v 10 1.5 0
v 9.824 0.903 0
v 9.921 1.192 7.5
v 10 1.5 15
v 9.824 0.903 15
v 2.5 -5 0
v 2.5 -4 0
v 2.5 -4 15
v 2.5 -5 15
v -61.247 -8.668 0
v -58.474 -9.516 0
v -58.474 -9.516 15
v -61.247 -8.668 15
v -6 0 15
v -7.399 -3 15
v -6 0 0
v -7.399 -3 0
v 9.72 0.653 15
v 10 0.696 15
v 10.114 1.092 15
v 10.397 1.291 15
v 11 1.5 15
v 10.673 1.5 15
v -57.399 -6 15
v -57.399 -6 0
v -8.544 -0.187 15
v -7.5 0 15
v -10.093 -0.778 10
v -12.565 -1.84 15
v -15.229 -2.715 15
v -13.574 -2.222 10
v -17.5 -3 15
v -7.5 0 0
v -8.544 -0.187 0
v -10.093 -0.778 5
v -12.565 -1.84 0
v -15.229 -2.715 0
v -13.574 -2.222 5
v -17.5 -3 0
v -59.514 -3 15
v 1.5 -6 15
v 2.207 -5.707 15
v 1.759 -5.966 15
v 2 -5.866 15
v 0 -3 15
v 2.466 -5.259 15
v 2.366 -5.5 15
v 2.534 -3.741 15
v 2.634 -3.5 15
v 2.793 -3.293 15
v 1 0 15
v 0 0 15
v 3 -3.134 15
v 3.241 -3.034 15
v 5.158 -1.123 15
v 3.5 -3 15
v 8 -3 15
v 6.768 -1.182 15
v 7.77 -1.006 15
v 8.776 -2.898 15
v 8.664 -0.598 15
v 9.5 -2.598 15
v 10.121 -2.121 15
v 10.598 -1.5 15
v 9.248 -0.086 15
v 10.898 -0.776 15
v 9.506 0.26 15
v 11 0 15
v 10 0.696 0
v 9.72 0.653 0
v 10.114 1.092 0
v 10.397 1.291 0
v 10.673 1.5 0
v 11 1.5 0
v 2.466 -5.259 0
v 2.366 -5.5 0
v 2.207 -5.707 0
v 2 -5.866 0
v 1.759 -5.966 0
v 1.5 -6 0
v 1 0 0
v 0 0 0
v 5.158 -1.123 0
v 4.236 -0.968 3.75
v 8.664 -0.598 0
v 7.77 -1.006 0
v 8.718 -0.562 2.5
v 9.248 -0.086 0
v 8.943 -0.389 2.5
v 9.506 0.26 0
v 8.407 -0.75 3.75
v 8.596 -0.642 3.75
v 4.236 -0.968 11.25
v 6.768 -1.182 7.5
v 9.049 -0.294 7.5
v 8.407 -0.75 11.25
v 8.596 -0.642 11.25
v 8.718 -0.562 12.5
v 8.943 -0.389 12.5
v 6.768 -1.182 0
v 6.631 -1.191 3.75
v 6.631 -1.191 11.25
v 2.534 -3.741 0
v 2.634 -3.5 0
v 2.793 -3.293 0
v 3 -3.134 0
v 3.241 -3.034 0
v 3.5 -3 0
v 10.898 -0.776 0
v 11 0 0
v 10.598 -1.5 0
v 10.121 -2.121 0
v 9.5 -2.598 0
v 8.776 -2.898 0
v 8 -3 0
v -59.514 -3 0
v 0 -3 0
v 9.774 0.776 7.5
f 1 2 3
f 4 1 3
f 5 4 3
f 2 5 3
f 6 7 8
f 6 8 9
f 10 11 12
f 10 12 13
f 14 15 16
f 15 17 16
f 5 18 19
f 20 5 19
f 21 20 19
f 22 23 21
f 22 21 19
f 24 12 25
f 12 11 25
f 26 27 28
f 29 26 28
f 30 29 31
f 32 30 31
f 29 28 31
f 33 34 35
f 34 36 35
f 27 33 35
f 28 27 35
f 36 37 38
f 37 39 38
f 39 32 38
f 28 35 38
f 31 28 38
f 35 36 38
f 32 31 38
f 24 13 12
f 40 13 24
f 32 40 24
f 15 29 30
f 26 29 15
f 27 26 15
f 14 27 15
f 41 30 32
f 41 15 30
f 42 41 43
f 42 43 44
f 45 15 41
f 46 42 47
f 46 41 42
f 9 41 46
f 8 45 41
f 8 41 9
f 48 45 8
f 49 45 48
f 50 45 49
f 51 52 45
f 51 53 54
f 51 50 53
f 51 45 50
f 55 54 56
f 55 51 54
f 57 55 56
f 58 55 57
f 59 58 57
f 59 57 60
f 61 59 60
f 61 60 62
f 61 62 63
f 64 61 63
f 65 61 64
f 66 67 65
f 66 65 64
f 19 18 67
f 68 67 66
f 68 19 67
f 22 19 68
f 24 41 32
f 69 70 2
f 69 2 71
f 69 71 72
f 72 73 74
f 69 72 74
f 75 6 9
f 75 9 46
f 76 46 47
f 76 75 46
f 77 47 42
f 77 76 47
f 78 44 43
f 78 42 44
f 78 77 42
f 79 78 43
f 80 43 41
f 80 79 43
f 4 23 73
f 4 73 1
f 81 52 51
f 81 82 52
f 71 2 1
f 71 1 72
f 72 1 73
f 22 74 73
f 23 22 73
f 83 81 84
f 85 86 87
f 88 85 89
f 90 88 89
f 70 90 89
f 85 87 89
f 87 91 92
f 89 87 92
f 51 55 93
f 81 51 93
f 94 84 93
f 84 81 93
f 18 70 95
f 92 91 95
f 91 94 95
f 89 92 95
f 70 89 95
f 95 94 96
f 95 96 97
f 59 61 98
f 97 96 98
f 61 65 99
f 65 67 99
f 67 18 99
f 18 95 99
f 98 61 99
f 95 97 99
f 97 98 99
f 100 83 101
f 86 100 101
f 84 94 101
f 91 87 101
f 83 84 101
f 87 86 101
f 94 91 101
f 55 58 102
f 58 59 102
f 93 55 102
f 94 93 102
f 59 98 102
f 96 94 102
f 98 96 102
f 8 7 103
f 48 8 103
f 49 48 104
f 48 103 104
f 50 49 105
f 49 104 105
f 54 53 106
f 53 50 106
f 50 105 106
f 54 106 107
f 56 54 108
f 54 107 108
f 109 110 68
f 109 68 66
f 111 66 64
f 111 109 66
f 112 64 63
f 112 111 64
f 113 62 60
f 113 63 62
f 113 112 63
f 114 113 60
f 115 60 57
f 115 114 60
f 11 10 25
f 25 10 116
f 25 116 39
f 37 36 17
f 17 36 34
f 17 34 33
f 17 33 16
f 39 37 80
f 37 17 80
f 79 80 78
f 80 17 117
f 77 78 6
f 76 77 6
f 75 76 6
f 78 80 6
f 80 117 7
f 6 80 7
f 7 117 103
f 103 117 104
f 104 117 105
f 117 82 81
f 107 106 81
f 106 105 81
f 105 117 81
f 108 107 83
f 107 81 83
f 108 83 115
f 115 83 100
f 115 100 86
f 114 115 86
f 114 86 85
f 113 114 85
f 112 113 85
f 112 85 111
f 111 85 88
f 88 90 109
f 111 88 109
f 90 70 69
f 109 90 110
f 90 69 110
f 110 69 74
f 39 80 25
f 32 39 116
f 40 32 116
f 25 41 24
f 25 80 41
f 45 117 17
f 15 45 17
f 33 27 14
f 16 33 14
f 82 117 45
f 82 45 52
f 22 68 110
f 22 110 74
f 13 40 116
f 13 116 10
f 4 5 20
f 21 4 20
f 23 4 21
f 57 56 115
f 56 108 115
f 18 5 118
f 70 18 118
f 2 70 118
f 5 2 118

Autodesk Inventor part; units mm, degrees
ref_plane "YZ Plane" through (0, 0, 0) normal (1, 0, 0) x (0, 1, 0)
ref_plane "XZ Plane" through (0, 0, 0) normal (0, 1, 0) x (-1, 0, 0)
ref_plane "XY Plane" through (0, 0, 0) normal (0, 0, 1) x (1, 0, 0)
sketch "Эскиз1" plane through (0, 0, 0) normal (0, 0, 1) x (1, 0, 0)
  line L0 (0, 0) -> (1, 0)
  line L1 (9, 0) -> (9, -3) construction
  line L2 (9, -3) -> (3.5, -3) construction
  line L3 (0, -3) -> (0, 0)
  line L4 (0, -3) -> (-7.3989, -3)
  line L5 (-7.3989, -3) -> (-7.3989, -6) construction
  line L6 (-7.3989, -6) -> (0, -6)
  line L7 (0, -6) -> (0, -3) construction
  line L8 (0, -3) -> (2.5, -3) construction
  line L9 (2.5, -4) -> (2.5, -5)
  line L10 (1.5, -6) -> (0, -6)
  line L11 (0, -6) -> (0, -3) construction
  line L12 (-7.3989, -3) -> (-6, 0)
  line L13 (-7.3989, -3) -> (-13.5, -3) construction
  line L14 (-57.3989, -3) -> (-57.3989, -6) construction
  line L15 (-57.3989, -6) -> (-7.3989, -6)
  line L16 (-7.3989, -6) -> (-7.3989, -3) construction
  arc A0 (1.5, -6) -> (2.5, -5) centre (1.5, -5) ccw
  arc A1 (3.5, -3) -> (2.5, -4) centre (3.5, -4) ccw
  line L17 (-13.5, -3) -> (-17.5, -3) construction
  line L18 (0, 0) -> (1, 0)
  line L19 (9, 0) -> (8, 0) construction
  arc A2 (1, 0) -> (8, 0) centre (4.5, 9.3675) ccw construction
  line L20 (-57.3989, -3) -> (-59.5142, -3)
  line L21 (-59.5142, -3) -> (-62.1244, -11.5373)
  line L22 (-62.1244, -12.6534) -> (-58.474, -12.6534) construction
  line L23 (-58.474, -12.6534) -> (-58.474, -9.5163) construction
  line L24 (-58.474, -12.6534) -> (3.765, -31.6817)
  line L25 (3.765, -31.6817) -> (4.6422, -28.8128)
  line L26 (4.6422, -28.8128) -> (-58.474, -9.5163)
  line L27 (-58.474, -9.5163) -> (-58.474, -12.6534) construction
  line L28 (-57.3989, -6) -> (-57.3989, -3) construction
  line L29 (-58.474, -9.5163) -> (-57.3989, -6)
  line L30 (-13.5, -3) -> (-17.5, -3) construction
  line L31 (-17.5, -3) -> (-57.3989, -3)
  line L32 (1, 0) -> (8, 0) construction
  line L33 (8, 0) -> (9, 0) construction
  line L34 (-58.474, -12.6534) -> (-62.1244, -11.5373)
  line L35 (-62.1244, -11.5373) -> (-62.1244, -12.6534) construction
  line L36 (-6, 0) -> (-7.5, 0) construction
  line L37 (-7.5, 0) -> (-7.5, -3) construction
  line L38 (-7.5, 0) -> (-9.5, 0) construction
  line L39 (-7.5, 0) -> (-9.5, 0) construction
  line L40 (-9.5, 0) -> (-13.5, -3) construction
  line L41 (-13.5, -3) -> (-17.5, -3) construction
  spline S0 degree 3 poles (-7.5, 0) (-9.5, 0) (-13.5, -3) (-17.5, -3) knots 1 1 1 1 2 2 2 2
  line L42 (-7.5, 0) -> (-6, 0)
  line L43 (9, -3) -> (11, -3) construction
  line L44 (11, 0) -> (11, 1.5)
  line L45 (11, 1.5) -> (10.6727, 1.5)
  arc A3 (1, 0) -> (10.6727, 1.5) centre (4.5, 9.3675) ccw
  line L46 (3.5, -3) -> (8, -3)
  arc A4 (8, -3) -> (11, 0) centre (8, 0) ccw
  point P0 (2.5, -6)
  point P1 (0, -6)
  point P2 (2, -4)
  dimension "d0" = 9
  dimension "d1" = 3
  dimension "d3" = 3
  dimension "d4" = 2.5
  dimension "d5" = 3
  dimension "d6" = 50
  dimension "d9" = 1
  dimension "d10" = 1
  dimension "d11" = 4
  dimension "d13" = 3
  dimension "d14" = 1
  dimension "d15" = 1
  dimension "d16" = 10
  dimension "d17" = 3.6504
  dimension "d18" = 10
  dimension "d20" = 3
  dimension "d21" = 65.0828
  dimension "d25" = 3.677
  dimension "d26" = 66
  dimension "d27" = 90
  dimension "d28" = 107
  dimension "d29" = 65
  dimension "d30" = 6
  dimension "d31" = 3
  dimension "d32" = 1.5
  dimension "d33" = 6
  dimension "d34" = 2
  dimension "d37" = 2
  dimension "d38" = 4.5
  dimension "d39" = 3
  dimension "d40" = 2.9
extrude "Выдавливание1" add sketch "Эскиз1" along normal blind 15
sketch "Эскиз3" plane through (0, 0, 15) normal (0, 0, 1) x (1, 0, 0)
  line L0 (-57.3989, -6) -> (1.5, -6) construction
  arc A0 (1.5, -6) -> (2.5, -5) centre (1.5, -5) ccw construction
  arc A1 (3.5, -3) -> (2.5, -4) centre (3.5, -4) ccw construction
  line L1 (1, 0) -> (0, 0) construction
  line L2 (0, 0) -> (0, -3) construction
  line L3 (0, -3) -> (-7.3989, -3) construction
  line L4 (-7.3989, -3) -> (-6, 0) construction
  line L5 (-6, 0) -> (-7.5, 0) construction
  line L6 (-17.5, -3) -> (-59.5142, -3) construction
  line L7 (-59.5142, -3) -> (-62.1244, -11.5373) construction
  line L8 (-62.1244, -11.5373) -> (3.765, -31.6817) construction
  line L9 (3.765, -31.6817) -> (4.6422, -28.8128) construction
  line L10 (4.6422, -28.8128) -> (-58.474, -9.5163) construction
  line L11 (-58.474, -9.5163) -> (-57.3989, -6) construction
  line L12 (4.6422, -28.8128) -> (-58.474, -9.5163) construction
  line L13 (-58.474, -9.5163) -> (-61.2472, -8.6684)
  line L14 (-58.474, -9.5163) -> (8.3891, -25.5344)
  line L15 (8.3891, -25.5344) -> (5.592, -37.2821)
  line L16 (5.592, -37.2821) -> (-67.5523, -14.3814)
  line L17 (-67.5523, -14.3814) -> (-63.6325, -8.2805)
  line L18 (-63.6325, -8.2805) -> (-61.2472, -8.6684)
  line L19 (2.5, -5) -> (2.5, -4) projected
  line L20 (3.5, -3) -> (8, -3) projected
  arc A2 (8, -3) -> (11, 0) centre (8, 0) ccw projected
  line L21 (11, 0) -> (11, 1.5) projected
  line L22 (11, 1.5) -> (10.6727, 1.5) projected
  arc A3 (1, 0) -> (10.6727, 1.5) centre (4.5, 9.3675) ccw projected
extrude "Выдавливание2" cut sketch "Эскиз3" against normal blind 25
sketch "Эскиз4" plane through (0, 0, 15) normal (0, 0, 1) x (1, 0, 0)
  line L0 (-61.2472, -8.6684) -> (-58.474, -9.5163) construction
  line L1 (-58.474, -9.5163) -> (-57.3989, -6) construction
  line L2 (-57.3989, -6) -> (1.5, -6) construction
  arc A0 (1.5, -6) -> (2.5, -5) centre (1.5, -5) ccw construction
  line L3 (2.5, -5) -> (2.5, -4) construction
  arc A1 (3.5, -3) -> (2.5, -4) centre (3.5, -4) ccw construction
  line L4 (3.5, -3) -> (8, -3) construction
  arc A2 (8, -3) -> (11, 0) centre (8, 0) ccw construction
  line L5 (11, 0) -> (11, 1.5) construction
  line L6 (11, 1.5) -> (10.6727, 1.5) construction
  arc A3 (1, 0) -> (10.6727, 1.5) centre (4.5, 9.3675) ccw construction
  line L7 (1, 0) -> (0, 0) construction
  line L8 (0, 0) -> (0, -3) construction
  line L9 (0, -3) -> (-7.3989, -3) construction
  line L10 (-7.3989, -3) -> (-6, 0) construction
  line L11 (-6, 0) -> (-7.5, 0) construction
  line L12 (-17.5, -3) -> (-59.5142, -3) construction
  line L13 (-59.5142, -3) -> (-61.2472, -8.6684) construction
  arc A4 (1, 0) -> (10.6727, 1.5) centre (4.5, 9.3675) ccw construction
  line L14 (1, 0) -> (9, -3) construction
  line L15 (9, -3) -> (10.6727, 1.5) construction
  spline S0 degree 2 poles (1, 0) (9, -3) (10.6727, 1.5) knots 1 1 1 2 2 2 construction
  line L16 (1, 0) -> (10.6727, 1.5) construction
  line L17 (11, 1.5) -> (10.6727, 1.5) projected
  line L18 (11, 1.5) -> (10, 1.5)
  line L19 (1, 0) -> (9, -3) construction
  line L20 (9, -3) -> (10, 1.5) construction
  spline S1 degree 2 poles (1, 0) (9, -3) (10, 1.5) knots 1 1 1 2 2 2
  line L21 (11, 0) -> (11, 1.5) projected
  line L22 (11, 1.5) -> (10, 0.696)
  line L23 (10, 0.696) -> (9.7197, 0.6526)
  line L24 (1, 0) -> (10, 1.5)
  dimension "d43" = 1
extrude "Выдавливание3" add sketch "Эскиз4" against normal up to surface (15 mm away) contours L22 L23 S1 L18 L17
extrude "Выдавливание4" cut sketch "Эскиз4" against normal up to surface (15 mm away) contours S1 L24
properties part number "bat_lock03"
